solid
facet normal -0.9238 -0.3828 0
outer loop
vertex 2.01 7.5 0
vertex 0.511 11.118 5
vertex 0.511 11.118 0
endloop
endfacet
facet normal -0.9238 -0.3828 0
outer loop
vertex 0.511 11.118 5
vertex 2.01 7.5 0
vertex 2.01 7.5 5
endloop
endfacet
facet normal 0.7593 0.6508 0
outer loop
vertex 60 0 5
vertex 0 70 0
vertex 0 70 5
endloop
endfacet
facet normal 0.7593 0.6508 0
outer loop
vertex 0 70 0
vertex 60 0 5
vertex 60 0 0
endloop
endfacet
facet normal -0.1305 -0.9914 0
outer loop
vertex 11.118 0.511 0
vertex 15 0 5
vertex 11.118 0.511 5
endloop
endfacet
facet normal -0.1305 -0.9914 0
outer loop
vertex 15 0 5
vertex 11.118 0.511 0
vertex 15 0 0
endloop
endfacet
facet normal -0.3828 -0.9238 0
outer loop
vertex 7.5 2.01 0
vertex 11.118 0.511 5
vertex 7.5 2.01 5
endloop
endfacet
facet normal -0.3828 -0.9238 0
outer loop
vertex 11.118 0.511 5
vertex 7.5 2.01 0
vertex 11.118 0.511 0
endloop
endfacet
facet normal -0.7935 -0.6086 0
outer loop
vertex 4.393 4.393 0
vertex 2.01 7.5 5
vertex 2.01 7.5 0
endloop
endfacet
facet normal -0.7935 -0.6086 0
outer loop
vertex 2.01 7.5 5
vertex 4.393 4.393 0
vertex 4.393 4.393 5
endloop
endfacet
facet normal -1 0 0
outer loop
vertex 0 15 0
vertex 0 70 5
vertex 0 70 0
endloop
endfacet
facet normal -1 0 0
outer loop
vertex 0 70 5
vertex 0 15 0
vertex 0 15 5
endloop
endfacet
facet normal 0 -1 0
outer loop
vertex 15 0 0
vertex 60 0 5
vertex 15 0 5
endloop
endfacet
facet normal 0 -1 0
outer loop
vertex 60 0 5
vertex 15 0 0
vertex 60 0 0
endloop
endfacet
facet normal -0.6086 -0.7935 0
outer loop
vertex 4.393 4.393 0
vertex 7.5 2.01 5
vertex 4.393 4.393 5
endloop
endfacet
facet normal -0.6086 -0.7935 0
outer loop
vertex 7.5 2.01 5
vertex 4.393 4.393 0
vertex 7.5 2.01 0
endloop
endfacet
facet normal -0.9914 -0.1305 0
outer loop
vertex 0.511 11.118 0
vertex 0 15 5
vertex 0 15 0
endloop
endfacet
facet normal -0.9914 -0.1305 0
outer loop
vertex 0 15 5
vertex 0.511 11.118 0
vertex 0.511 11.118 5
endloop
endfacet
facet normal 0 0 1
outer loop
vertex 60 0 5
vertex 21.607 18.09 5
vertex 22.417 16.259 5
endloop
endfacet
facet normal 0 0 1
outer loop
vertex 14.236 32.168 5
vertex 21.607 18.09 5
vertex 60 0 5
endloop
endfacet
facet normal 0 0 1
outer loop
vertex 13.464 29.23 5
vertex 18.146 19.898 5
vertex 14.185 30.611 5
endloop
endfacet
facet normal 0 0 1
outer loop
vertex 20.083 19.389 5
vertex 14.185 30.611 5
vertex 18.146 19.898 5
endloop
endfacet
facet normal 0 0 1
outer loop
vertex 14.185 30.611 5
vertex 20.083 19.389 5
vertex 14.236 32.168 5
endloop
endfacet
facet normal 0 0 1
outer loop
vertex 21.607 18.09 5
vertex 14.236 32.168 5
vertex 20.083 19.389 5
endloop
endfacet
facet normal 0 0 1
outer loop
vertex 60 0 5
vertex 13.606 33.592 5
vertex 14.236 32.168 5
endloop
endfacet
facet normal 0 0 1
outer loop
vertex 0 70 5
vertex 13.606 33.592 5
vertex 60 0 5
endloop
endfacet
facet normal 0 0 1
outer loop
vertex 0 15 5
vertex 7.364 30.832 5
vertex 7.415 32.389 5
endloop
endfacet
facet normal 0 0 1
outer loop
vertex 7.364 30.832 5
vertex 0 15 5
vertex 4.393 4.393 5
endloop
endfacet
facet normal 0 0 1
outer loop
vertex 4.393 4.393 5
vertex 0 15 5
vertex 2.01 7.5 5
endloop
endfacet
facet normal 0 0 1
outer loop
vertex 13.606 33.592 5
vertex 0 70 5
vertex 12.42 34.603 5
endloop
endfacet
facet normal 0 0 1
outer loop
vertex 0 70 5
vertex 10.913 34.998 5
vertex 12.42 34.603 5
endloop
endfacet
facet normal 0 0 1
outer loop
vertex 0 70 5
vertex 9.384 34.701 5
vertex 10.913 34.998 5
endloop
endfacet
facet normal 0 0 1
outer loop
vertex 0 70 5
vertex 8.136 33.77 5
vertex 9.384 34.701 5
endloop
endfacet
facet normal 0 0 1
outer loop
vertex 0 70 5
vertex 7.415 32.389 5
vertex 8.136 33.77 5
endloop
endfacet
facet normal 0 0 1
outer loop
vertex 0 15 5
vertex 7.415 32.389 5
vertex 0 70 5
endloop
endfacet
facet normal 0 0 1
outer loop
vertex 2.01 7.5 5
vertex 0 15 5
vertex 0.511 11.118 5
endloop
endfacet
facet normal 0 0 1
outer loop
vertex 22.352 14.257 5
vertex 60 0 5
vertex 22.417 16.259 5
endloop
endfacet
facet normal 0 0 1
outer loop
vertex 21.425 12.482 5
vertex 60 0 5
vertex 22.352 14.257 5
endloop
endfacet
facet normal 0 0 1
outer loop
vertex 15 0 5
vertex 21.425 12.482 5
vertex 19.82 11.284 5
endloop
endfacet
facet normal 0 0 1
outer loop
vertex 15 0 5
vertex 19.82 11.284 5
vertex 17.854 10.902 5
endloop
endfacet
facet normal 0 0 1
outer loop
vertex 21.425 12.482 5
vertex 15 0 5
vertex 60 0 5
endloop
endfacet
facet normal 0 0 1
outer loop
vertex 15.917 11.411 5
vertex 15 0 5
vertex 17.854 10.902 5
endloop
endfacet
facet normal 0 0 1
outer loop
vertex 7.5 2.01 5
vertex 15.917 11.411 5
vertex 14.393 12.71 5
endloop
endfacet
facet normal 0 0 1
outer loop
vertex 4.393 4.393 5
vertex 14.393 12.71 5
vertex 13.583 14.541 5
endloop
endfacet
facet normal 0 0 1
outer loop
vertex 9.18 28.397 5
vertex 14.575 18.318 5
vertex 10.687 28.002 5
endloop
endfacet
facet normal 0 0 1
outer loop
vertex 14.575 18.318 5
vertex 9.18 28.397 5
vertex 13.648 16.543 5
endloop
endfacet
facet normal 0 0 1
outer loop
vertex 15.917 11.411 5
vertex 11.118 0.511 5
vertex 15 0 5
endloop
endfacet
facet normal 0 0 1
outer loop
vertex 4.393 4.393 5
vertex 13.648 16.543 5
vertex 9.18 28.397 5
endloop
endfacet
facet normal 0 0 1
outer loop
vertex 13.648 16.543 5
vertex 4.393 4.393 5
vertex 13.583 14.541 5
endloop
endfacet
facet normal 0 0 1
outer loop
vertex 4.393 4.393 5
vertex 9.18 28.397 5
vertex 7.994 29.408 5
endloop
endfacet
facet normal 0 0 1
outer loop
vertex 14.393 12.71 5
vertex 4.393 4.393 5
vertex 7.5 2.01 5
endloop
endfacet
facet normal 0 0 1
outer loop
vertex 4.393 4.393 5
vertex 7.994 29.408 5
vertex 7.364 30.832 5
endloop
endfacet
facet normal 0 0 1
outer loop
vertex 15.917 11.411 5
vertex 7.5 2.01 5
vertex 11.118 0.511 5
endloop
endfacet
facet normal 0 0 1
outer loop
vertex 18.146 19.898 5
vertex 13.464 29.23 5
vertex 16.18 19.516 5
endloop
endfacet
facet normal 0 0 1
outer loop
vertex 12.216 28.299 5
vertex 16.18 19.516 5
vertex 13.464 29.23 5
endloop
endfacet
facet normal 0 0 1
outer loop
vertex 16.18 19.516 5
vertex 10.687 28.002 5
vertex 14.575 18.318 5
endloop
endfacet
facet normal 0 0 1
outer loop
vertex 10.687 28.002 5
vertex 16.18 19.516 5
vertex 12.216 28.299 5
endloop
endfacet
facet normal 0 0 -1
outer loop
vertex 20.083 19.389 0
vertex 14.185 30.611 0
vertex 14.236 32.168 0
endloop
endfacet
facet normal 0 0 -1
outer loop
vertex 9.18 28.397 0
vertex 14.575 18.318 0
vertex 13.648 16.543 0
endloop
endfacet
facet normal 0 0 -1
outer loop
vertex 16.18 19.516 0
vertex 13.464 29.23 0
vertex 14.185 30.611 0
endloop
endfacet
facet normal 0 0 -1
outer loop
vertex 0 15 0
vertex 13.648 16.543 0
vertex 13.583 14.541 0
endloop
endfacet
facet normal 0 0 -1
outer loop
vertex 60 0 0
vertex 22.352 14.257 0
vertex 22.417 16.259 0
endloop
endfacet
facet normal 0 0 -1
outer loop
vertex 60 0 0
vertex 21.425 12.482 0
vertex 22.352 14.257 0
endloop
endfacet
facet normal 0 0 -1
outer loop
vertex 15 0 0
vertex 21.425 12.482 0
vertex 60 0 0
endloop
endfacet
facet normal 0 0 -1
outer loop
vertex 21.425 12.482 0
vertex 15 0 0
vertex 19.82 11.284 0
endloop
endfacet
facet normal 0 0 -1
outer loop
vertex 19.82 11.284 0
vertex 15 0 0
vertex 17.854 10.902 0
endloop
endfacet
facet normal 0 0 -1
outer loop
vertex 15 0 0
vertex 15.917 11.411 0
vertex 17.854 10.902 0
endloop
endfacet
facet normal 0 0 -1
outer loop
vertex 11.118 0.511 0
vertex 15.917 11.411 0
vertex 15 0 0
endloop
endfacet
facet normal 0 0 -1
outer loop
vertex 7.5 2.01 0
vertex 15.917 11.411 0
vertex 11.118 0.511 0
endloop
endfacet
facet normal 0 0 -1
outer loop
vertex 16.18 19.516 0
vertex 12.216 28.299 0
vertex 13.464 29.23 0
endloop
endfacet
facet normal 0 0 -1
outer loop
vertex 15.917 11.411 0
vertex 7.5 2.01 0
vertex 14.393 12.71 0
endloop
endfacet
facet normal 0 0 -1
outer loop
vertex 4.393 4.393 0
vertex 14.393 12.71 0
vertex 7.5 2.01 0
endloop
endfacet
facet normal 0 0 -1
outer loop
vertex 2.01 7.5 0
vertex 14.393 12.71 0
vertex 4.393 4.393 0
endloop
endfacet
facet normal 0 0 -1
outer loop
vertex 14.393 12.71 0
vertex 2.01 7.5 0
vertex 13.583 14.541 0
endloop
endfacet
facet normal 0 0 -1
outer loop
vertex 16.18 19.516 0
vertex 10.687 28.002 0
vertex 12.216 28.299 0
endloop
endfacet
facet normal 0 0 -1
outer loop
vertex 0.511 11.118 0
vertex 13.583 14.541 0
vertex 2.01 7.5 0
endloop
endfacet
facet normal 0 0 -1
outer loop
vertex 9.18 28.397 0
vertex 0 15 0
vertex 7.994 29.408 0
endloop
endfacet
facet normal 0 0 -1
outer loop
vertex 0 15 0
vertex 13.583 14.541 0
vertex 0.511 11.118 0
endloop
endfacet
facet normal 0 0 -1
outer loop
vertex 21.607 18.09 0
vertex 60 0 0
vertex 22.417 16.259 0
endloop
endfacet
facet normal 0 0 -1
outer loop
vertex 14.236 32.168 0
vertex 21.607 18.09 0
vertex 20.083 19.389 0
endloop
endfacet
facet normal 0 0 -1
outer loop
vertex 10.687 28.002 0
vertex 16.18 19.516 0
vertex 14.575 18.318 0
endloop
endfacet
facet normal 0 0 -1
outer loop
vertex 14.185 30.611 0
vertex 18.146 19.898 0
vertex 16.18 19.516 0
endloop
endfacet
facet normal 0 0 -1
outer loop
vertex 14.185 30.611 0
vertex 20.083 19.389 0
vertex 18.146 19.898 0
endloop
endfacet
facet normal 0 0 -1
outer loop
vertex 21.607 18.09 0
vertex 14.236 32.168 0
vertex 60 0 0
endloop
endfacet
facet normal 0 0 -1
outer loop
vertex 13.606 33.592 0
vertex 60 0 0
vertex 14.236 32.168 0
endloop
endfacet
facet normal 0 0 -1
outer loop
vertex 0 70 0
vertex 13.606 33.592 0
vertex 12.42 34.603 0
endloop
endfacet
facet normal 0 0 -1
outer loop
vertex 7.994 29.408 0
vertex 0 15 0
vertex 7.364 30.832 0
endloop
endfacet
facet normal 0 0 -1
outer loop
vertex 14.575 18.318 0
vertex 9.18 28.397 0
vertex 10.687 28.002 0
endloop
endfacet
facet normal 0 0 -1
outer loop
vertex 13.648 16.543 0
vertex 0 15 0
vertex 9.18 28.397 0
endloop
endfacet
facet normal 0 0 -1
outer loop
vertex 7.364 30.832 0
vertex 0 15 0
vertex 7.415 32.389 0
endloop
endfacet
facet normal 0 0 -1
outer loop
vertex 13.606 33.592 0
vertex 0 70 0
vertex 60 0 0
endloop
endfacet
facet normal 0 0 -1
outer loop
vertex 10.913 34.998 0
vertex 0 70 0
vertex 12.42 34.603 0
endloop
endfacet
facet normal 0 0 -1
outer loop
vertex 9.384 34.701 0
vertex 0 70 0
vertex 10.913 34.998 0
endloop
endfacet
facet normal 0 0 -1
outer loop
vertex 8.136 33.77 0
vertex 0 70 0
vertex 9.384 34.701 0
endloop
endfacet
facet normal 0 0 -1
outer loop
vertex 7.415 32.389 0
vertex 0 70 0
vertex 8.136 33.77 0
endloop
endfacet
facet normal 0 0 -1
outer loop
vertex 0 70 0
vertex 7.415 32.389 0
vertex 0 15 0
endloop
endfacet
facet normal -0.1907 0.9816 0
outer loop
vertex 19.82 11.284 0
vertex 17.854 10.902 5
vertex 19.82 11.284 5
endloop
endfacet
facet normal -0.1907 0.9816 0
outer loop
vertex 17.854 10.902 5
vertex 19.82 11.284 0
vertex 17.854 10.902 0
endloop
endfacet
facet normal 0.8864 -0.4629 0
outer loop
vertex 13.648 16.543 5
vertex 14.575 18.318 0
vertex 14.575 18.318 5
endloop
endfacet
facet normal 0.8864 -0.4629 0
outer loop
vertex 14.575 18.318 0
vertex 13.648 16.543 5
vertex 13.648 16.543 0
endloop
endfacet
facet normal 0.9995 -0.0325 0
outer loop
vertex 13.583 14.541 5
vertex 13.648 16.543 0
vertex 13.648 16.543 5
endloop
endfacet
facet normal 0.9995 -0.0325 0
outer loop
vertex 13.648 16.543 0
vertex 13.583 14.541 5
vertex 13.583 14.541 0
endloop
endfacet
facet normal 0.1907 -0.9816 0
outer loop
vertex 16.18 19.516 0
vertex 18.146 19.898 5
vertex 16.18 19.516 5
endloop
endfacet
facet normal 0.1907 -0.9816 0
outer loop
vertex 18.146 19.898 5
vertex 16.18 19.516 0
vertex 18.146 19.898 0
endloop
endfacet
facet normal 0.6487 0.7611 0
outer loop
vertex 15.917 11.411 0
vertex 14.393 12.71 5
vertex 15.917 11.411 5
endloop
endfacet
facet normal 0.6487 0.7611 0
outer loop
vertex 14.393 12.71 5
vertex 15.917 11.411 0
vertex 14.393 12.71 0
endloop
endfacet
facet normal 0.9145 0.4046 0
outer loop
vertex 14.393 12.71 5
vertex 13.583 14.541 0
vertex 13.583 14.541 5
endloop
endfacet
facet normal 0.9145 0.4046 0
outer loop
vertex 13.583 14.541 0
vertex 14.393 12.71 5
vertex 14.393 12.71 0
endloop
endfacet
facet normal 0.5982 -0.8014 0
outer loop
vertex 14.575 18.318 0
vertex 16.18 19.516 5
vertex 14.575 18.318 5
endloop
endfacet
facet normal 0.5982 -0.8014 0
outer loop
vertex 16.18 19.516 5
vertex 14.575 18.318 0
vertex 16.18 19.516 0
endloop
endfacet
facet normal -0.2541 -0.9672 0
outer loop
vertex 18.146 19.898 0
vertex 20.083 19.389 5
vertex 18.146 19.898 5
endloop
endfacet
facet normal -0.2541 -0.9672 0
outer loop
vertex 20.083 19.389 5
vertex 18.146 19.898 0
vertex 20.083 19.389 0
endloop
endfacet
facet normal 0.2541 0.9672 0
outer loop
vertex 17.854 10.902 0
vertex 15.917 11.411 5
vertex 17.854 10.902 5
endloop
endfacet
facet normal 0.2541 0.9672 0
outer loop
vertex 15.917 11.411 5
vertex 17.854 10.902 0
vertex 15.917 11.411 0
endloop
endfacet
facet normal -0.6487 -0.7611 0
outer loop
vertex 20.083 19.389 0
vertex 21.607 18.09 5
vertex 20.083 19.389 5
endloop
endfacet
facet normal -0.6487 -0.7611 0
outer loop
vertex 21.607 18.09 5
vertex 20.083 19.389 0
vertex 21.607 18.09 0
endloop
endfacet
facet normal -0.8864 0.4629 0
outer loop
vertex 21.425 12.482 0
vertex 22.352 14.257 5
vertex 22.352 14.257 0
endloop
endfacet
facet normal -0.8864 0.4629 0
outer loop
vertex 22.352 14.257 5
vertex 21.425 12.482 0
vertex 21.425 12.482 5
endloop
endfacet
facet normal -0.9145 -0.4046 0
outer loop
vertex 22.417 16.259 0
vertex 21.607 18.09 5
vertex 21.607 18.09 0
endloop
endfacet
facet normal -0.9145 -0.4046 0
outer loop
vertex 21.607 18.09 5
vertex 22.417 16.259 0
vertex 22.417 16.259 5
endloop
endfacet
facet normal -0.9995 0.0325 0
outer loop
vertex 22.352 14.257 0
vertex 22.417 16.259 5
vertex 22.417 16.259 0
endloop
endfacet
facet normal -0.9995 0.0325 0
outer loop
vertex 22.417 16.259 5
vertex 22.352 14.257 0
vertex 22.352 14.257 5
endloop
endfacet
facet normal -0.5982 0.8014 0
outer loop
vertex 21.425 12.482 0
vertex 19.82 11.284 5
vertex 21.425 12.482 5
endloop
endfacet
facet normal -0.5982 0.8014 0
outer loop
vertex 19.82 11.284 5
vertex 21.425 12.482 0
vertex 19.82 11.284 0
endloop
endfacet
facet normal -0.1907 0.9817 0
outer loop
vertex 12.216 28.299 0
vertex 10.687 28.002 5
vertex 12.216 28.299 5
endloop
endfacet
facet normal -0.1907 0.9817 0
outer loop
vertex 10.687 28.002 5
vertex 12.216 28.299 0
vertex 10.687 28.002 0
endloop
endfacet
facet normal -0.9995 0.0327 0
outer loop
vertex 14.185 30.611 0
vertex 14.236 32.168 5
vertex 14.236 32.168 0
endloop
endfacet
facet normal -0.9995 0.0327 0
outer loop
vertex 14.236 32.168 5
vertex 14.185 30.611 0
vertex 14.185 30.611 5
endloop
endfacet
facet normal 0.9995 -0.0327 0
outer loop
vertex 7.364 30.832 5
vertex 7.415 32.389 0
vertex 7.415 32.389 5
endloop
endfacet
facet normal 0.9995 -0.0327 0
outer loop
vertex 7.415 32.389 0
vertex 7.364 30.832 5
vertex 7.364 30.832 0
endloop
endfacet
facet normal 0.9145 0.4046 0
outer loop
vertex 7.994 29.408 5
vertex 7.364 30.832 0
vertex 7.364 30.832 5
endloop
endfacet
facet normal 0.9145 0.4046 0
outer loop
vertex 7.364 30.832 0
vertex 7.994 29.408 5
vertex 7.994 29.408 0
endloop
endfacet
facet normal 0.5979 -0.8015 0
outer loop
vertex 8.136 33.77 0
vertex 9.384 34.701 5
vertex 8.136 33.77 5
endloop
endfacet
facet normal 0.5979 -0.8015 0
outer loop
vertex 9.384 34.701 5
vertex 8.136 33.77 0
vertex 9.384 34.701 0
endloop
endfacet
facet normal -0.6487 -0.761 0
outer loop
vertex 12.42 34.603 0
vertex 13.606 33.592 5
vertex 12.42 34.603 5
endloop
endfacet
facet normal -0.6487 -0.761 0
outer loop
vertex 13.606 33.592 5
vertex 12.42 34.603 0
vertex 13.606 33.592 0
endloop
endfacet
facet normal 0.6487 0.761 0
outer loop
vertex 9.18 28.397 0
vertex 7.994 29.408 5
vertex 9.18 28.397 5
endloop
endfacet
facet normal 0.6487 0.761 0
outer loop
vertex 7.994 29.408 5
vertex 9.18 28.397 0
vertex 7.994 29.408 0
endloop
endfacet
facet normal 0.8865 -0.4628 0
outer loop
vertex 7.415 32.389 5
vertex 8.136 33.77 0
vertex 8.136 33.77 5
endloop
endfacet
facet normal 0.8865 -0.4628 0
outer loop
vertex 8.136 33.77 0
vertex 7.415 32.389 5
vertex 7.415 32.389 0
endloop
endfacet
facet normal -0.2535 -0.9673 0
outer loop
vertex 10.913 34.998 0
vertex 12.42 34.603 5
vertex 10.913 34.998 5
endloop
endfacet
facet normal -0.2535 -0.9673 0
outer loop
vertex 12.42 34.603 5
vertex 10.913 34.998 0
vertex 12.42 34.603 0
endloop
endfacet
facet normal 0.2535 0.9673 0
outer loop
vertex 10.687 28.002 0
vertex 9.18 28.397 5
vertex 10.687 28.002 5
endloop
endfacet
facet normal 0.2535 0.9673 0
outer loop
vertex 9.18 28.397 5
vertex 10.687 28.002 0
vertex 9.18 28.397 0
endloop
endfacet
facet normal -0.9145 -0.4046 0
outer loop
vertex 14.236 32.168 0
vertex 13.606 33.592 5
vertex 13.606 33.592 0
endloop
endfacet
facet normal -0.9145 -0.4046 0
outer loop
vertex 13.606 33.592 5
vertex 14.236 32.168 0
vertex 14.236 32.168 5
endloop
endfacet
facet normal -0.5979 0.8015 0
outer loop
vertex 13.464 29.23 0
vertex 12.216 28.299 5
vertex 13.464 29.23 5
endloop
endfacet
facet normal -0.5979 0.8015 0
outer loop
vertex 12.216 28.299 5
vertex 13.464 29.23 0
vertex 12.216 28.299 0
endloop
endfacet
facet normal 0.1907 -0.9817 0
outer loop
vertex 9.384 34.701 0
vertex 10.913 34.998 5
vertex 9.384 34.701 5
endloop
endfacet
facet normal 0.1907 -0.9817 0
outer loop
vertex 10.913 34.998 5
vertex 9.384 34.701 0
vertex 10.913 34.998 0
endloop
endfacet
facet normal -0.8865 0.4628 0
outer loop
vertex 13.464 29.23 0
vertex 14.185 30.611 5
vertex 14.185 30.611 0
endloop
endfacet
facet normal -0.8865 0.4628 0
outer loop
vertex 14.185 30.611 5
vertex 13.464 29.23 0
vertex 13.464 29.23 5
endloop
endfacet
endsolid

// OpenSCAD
$fn = 32;

// ----------------------------------------------------------------------
// Bracket plate: corner pad 60 x 70, fillet R15
// ----------------------------------------------------------------------

// --- parameters (mm) ---
hole_r = 3.5;             // bolt hole radius
plate_t = 5;              // plate thickness, Z (extrusion height)
leg_a = 60;               // base leg
leg_b = 70;               // height leg
fillet_r = 15;            // right-angle fillet radius

hole_d1 = 2 * hole_r + 2;
hole_d2 = 2 * hole_r;

profile = [[15, 0], [60, 0], [0, 70], [0, 15], [0.511, 11.118], [2.01, 7.5], [4.393, 4.393], [7.5, 2.01], [11.118, 0.511]];  // primary outline, 9 points, counter clockwise
void_1 = [[22.417, 16.259], [21.607, 18.09], [20.083, 19.389], [18.146, 19.898], [16.18, 19.516], [14.575, 18.318], [13.648, 16.543], [13.583, 14.541], [14.393, 12.71], [15.917, 11.411], [17.854, 10.902], [19.82, 11.284], [21.425, 12.482], [22.352, 14.257]];  // mount hole 1, 14 points
void_2 = [[14.236, 32.168], [13.606, 33.592], [12.42, 34.603], [10.913, 34.998], [9.384, 34.701], [8.136, 33.77], [7.415, 32.389], [7.364, 30.832], [7.994, 29.408], [9.18, 28.397], [10.687, 28.002], [12.216, 28.299], [13.464, 29.23], [14.185, 30.611]];  // mount hole 2, 14 points

// --- the one profile operation ---
difference() {
  linear_extrude(height = plate_t) polygon(points = profile);
  translate([0, 0, -1])
    linear_extrude(height = plate_t + 2) polygon(points = void_1);
  translate([0, 0, -1])
    linear_extrude(height = plate_t + 2) polygon(points = void_2);
}
